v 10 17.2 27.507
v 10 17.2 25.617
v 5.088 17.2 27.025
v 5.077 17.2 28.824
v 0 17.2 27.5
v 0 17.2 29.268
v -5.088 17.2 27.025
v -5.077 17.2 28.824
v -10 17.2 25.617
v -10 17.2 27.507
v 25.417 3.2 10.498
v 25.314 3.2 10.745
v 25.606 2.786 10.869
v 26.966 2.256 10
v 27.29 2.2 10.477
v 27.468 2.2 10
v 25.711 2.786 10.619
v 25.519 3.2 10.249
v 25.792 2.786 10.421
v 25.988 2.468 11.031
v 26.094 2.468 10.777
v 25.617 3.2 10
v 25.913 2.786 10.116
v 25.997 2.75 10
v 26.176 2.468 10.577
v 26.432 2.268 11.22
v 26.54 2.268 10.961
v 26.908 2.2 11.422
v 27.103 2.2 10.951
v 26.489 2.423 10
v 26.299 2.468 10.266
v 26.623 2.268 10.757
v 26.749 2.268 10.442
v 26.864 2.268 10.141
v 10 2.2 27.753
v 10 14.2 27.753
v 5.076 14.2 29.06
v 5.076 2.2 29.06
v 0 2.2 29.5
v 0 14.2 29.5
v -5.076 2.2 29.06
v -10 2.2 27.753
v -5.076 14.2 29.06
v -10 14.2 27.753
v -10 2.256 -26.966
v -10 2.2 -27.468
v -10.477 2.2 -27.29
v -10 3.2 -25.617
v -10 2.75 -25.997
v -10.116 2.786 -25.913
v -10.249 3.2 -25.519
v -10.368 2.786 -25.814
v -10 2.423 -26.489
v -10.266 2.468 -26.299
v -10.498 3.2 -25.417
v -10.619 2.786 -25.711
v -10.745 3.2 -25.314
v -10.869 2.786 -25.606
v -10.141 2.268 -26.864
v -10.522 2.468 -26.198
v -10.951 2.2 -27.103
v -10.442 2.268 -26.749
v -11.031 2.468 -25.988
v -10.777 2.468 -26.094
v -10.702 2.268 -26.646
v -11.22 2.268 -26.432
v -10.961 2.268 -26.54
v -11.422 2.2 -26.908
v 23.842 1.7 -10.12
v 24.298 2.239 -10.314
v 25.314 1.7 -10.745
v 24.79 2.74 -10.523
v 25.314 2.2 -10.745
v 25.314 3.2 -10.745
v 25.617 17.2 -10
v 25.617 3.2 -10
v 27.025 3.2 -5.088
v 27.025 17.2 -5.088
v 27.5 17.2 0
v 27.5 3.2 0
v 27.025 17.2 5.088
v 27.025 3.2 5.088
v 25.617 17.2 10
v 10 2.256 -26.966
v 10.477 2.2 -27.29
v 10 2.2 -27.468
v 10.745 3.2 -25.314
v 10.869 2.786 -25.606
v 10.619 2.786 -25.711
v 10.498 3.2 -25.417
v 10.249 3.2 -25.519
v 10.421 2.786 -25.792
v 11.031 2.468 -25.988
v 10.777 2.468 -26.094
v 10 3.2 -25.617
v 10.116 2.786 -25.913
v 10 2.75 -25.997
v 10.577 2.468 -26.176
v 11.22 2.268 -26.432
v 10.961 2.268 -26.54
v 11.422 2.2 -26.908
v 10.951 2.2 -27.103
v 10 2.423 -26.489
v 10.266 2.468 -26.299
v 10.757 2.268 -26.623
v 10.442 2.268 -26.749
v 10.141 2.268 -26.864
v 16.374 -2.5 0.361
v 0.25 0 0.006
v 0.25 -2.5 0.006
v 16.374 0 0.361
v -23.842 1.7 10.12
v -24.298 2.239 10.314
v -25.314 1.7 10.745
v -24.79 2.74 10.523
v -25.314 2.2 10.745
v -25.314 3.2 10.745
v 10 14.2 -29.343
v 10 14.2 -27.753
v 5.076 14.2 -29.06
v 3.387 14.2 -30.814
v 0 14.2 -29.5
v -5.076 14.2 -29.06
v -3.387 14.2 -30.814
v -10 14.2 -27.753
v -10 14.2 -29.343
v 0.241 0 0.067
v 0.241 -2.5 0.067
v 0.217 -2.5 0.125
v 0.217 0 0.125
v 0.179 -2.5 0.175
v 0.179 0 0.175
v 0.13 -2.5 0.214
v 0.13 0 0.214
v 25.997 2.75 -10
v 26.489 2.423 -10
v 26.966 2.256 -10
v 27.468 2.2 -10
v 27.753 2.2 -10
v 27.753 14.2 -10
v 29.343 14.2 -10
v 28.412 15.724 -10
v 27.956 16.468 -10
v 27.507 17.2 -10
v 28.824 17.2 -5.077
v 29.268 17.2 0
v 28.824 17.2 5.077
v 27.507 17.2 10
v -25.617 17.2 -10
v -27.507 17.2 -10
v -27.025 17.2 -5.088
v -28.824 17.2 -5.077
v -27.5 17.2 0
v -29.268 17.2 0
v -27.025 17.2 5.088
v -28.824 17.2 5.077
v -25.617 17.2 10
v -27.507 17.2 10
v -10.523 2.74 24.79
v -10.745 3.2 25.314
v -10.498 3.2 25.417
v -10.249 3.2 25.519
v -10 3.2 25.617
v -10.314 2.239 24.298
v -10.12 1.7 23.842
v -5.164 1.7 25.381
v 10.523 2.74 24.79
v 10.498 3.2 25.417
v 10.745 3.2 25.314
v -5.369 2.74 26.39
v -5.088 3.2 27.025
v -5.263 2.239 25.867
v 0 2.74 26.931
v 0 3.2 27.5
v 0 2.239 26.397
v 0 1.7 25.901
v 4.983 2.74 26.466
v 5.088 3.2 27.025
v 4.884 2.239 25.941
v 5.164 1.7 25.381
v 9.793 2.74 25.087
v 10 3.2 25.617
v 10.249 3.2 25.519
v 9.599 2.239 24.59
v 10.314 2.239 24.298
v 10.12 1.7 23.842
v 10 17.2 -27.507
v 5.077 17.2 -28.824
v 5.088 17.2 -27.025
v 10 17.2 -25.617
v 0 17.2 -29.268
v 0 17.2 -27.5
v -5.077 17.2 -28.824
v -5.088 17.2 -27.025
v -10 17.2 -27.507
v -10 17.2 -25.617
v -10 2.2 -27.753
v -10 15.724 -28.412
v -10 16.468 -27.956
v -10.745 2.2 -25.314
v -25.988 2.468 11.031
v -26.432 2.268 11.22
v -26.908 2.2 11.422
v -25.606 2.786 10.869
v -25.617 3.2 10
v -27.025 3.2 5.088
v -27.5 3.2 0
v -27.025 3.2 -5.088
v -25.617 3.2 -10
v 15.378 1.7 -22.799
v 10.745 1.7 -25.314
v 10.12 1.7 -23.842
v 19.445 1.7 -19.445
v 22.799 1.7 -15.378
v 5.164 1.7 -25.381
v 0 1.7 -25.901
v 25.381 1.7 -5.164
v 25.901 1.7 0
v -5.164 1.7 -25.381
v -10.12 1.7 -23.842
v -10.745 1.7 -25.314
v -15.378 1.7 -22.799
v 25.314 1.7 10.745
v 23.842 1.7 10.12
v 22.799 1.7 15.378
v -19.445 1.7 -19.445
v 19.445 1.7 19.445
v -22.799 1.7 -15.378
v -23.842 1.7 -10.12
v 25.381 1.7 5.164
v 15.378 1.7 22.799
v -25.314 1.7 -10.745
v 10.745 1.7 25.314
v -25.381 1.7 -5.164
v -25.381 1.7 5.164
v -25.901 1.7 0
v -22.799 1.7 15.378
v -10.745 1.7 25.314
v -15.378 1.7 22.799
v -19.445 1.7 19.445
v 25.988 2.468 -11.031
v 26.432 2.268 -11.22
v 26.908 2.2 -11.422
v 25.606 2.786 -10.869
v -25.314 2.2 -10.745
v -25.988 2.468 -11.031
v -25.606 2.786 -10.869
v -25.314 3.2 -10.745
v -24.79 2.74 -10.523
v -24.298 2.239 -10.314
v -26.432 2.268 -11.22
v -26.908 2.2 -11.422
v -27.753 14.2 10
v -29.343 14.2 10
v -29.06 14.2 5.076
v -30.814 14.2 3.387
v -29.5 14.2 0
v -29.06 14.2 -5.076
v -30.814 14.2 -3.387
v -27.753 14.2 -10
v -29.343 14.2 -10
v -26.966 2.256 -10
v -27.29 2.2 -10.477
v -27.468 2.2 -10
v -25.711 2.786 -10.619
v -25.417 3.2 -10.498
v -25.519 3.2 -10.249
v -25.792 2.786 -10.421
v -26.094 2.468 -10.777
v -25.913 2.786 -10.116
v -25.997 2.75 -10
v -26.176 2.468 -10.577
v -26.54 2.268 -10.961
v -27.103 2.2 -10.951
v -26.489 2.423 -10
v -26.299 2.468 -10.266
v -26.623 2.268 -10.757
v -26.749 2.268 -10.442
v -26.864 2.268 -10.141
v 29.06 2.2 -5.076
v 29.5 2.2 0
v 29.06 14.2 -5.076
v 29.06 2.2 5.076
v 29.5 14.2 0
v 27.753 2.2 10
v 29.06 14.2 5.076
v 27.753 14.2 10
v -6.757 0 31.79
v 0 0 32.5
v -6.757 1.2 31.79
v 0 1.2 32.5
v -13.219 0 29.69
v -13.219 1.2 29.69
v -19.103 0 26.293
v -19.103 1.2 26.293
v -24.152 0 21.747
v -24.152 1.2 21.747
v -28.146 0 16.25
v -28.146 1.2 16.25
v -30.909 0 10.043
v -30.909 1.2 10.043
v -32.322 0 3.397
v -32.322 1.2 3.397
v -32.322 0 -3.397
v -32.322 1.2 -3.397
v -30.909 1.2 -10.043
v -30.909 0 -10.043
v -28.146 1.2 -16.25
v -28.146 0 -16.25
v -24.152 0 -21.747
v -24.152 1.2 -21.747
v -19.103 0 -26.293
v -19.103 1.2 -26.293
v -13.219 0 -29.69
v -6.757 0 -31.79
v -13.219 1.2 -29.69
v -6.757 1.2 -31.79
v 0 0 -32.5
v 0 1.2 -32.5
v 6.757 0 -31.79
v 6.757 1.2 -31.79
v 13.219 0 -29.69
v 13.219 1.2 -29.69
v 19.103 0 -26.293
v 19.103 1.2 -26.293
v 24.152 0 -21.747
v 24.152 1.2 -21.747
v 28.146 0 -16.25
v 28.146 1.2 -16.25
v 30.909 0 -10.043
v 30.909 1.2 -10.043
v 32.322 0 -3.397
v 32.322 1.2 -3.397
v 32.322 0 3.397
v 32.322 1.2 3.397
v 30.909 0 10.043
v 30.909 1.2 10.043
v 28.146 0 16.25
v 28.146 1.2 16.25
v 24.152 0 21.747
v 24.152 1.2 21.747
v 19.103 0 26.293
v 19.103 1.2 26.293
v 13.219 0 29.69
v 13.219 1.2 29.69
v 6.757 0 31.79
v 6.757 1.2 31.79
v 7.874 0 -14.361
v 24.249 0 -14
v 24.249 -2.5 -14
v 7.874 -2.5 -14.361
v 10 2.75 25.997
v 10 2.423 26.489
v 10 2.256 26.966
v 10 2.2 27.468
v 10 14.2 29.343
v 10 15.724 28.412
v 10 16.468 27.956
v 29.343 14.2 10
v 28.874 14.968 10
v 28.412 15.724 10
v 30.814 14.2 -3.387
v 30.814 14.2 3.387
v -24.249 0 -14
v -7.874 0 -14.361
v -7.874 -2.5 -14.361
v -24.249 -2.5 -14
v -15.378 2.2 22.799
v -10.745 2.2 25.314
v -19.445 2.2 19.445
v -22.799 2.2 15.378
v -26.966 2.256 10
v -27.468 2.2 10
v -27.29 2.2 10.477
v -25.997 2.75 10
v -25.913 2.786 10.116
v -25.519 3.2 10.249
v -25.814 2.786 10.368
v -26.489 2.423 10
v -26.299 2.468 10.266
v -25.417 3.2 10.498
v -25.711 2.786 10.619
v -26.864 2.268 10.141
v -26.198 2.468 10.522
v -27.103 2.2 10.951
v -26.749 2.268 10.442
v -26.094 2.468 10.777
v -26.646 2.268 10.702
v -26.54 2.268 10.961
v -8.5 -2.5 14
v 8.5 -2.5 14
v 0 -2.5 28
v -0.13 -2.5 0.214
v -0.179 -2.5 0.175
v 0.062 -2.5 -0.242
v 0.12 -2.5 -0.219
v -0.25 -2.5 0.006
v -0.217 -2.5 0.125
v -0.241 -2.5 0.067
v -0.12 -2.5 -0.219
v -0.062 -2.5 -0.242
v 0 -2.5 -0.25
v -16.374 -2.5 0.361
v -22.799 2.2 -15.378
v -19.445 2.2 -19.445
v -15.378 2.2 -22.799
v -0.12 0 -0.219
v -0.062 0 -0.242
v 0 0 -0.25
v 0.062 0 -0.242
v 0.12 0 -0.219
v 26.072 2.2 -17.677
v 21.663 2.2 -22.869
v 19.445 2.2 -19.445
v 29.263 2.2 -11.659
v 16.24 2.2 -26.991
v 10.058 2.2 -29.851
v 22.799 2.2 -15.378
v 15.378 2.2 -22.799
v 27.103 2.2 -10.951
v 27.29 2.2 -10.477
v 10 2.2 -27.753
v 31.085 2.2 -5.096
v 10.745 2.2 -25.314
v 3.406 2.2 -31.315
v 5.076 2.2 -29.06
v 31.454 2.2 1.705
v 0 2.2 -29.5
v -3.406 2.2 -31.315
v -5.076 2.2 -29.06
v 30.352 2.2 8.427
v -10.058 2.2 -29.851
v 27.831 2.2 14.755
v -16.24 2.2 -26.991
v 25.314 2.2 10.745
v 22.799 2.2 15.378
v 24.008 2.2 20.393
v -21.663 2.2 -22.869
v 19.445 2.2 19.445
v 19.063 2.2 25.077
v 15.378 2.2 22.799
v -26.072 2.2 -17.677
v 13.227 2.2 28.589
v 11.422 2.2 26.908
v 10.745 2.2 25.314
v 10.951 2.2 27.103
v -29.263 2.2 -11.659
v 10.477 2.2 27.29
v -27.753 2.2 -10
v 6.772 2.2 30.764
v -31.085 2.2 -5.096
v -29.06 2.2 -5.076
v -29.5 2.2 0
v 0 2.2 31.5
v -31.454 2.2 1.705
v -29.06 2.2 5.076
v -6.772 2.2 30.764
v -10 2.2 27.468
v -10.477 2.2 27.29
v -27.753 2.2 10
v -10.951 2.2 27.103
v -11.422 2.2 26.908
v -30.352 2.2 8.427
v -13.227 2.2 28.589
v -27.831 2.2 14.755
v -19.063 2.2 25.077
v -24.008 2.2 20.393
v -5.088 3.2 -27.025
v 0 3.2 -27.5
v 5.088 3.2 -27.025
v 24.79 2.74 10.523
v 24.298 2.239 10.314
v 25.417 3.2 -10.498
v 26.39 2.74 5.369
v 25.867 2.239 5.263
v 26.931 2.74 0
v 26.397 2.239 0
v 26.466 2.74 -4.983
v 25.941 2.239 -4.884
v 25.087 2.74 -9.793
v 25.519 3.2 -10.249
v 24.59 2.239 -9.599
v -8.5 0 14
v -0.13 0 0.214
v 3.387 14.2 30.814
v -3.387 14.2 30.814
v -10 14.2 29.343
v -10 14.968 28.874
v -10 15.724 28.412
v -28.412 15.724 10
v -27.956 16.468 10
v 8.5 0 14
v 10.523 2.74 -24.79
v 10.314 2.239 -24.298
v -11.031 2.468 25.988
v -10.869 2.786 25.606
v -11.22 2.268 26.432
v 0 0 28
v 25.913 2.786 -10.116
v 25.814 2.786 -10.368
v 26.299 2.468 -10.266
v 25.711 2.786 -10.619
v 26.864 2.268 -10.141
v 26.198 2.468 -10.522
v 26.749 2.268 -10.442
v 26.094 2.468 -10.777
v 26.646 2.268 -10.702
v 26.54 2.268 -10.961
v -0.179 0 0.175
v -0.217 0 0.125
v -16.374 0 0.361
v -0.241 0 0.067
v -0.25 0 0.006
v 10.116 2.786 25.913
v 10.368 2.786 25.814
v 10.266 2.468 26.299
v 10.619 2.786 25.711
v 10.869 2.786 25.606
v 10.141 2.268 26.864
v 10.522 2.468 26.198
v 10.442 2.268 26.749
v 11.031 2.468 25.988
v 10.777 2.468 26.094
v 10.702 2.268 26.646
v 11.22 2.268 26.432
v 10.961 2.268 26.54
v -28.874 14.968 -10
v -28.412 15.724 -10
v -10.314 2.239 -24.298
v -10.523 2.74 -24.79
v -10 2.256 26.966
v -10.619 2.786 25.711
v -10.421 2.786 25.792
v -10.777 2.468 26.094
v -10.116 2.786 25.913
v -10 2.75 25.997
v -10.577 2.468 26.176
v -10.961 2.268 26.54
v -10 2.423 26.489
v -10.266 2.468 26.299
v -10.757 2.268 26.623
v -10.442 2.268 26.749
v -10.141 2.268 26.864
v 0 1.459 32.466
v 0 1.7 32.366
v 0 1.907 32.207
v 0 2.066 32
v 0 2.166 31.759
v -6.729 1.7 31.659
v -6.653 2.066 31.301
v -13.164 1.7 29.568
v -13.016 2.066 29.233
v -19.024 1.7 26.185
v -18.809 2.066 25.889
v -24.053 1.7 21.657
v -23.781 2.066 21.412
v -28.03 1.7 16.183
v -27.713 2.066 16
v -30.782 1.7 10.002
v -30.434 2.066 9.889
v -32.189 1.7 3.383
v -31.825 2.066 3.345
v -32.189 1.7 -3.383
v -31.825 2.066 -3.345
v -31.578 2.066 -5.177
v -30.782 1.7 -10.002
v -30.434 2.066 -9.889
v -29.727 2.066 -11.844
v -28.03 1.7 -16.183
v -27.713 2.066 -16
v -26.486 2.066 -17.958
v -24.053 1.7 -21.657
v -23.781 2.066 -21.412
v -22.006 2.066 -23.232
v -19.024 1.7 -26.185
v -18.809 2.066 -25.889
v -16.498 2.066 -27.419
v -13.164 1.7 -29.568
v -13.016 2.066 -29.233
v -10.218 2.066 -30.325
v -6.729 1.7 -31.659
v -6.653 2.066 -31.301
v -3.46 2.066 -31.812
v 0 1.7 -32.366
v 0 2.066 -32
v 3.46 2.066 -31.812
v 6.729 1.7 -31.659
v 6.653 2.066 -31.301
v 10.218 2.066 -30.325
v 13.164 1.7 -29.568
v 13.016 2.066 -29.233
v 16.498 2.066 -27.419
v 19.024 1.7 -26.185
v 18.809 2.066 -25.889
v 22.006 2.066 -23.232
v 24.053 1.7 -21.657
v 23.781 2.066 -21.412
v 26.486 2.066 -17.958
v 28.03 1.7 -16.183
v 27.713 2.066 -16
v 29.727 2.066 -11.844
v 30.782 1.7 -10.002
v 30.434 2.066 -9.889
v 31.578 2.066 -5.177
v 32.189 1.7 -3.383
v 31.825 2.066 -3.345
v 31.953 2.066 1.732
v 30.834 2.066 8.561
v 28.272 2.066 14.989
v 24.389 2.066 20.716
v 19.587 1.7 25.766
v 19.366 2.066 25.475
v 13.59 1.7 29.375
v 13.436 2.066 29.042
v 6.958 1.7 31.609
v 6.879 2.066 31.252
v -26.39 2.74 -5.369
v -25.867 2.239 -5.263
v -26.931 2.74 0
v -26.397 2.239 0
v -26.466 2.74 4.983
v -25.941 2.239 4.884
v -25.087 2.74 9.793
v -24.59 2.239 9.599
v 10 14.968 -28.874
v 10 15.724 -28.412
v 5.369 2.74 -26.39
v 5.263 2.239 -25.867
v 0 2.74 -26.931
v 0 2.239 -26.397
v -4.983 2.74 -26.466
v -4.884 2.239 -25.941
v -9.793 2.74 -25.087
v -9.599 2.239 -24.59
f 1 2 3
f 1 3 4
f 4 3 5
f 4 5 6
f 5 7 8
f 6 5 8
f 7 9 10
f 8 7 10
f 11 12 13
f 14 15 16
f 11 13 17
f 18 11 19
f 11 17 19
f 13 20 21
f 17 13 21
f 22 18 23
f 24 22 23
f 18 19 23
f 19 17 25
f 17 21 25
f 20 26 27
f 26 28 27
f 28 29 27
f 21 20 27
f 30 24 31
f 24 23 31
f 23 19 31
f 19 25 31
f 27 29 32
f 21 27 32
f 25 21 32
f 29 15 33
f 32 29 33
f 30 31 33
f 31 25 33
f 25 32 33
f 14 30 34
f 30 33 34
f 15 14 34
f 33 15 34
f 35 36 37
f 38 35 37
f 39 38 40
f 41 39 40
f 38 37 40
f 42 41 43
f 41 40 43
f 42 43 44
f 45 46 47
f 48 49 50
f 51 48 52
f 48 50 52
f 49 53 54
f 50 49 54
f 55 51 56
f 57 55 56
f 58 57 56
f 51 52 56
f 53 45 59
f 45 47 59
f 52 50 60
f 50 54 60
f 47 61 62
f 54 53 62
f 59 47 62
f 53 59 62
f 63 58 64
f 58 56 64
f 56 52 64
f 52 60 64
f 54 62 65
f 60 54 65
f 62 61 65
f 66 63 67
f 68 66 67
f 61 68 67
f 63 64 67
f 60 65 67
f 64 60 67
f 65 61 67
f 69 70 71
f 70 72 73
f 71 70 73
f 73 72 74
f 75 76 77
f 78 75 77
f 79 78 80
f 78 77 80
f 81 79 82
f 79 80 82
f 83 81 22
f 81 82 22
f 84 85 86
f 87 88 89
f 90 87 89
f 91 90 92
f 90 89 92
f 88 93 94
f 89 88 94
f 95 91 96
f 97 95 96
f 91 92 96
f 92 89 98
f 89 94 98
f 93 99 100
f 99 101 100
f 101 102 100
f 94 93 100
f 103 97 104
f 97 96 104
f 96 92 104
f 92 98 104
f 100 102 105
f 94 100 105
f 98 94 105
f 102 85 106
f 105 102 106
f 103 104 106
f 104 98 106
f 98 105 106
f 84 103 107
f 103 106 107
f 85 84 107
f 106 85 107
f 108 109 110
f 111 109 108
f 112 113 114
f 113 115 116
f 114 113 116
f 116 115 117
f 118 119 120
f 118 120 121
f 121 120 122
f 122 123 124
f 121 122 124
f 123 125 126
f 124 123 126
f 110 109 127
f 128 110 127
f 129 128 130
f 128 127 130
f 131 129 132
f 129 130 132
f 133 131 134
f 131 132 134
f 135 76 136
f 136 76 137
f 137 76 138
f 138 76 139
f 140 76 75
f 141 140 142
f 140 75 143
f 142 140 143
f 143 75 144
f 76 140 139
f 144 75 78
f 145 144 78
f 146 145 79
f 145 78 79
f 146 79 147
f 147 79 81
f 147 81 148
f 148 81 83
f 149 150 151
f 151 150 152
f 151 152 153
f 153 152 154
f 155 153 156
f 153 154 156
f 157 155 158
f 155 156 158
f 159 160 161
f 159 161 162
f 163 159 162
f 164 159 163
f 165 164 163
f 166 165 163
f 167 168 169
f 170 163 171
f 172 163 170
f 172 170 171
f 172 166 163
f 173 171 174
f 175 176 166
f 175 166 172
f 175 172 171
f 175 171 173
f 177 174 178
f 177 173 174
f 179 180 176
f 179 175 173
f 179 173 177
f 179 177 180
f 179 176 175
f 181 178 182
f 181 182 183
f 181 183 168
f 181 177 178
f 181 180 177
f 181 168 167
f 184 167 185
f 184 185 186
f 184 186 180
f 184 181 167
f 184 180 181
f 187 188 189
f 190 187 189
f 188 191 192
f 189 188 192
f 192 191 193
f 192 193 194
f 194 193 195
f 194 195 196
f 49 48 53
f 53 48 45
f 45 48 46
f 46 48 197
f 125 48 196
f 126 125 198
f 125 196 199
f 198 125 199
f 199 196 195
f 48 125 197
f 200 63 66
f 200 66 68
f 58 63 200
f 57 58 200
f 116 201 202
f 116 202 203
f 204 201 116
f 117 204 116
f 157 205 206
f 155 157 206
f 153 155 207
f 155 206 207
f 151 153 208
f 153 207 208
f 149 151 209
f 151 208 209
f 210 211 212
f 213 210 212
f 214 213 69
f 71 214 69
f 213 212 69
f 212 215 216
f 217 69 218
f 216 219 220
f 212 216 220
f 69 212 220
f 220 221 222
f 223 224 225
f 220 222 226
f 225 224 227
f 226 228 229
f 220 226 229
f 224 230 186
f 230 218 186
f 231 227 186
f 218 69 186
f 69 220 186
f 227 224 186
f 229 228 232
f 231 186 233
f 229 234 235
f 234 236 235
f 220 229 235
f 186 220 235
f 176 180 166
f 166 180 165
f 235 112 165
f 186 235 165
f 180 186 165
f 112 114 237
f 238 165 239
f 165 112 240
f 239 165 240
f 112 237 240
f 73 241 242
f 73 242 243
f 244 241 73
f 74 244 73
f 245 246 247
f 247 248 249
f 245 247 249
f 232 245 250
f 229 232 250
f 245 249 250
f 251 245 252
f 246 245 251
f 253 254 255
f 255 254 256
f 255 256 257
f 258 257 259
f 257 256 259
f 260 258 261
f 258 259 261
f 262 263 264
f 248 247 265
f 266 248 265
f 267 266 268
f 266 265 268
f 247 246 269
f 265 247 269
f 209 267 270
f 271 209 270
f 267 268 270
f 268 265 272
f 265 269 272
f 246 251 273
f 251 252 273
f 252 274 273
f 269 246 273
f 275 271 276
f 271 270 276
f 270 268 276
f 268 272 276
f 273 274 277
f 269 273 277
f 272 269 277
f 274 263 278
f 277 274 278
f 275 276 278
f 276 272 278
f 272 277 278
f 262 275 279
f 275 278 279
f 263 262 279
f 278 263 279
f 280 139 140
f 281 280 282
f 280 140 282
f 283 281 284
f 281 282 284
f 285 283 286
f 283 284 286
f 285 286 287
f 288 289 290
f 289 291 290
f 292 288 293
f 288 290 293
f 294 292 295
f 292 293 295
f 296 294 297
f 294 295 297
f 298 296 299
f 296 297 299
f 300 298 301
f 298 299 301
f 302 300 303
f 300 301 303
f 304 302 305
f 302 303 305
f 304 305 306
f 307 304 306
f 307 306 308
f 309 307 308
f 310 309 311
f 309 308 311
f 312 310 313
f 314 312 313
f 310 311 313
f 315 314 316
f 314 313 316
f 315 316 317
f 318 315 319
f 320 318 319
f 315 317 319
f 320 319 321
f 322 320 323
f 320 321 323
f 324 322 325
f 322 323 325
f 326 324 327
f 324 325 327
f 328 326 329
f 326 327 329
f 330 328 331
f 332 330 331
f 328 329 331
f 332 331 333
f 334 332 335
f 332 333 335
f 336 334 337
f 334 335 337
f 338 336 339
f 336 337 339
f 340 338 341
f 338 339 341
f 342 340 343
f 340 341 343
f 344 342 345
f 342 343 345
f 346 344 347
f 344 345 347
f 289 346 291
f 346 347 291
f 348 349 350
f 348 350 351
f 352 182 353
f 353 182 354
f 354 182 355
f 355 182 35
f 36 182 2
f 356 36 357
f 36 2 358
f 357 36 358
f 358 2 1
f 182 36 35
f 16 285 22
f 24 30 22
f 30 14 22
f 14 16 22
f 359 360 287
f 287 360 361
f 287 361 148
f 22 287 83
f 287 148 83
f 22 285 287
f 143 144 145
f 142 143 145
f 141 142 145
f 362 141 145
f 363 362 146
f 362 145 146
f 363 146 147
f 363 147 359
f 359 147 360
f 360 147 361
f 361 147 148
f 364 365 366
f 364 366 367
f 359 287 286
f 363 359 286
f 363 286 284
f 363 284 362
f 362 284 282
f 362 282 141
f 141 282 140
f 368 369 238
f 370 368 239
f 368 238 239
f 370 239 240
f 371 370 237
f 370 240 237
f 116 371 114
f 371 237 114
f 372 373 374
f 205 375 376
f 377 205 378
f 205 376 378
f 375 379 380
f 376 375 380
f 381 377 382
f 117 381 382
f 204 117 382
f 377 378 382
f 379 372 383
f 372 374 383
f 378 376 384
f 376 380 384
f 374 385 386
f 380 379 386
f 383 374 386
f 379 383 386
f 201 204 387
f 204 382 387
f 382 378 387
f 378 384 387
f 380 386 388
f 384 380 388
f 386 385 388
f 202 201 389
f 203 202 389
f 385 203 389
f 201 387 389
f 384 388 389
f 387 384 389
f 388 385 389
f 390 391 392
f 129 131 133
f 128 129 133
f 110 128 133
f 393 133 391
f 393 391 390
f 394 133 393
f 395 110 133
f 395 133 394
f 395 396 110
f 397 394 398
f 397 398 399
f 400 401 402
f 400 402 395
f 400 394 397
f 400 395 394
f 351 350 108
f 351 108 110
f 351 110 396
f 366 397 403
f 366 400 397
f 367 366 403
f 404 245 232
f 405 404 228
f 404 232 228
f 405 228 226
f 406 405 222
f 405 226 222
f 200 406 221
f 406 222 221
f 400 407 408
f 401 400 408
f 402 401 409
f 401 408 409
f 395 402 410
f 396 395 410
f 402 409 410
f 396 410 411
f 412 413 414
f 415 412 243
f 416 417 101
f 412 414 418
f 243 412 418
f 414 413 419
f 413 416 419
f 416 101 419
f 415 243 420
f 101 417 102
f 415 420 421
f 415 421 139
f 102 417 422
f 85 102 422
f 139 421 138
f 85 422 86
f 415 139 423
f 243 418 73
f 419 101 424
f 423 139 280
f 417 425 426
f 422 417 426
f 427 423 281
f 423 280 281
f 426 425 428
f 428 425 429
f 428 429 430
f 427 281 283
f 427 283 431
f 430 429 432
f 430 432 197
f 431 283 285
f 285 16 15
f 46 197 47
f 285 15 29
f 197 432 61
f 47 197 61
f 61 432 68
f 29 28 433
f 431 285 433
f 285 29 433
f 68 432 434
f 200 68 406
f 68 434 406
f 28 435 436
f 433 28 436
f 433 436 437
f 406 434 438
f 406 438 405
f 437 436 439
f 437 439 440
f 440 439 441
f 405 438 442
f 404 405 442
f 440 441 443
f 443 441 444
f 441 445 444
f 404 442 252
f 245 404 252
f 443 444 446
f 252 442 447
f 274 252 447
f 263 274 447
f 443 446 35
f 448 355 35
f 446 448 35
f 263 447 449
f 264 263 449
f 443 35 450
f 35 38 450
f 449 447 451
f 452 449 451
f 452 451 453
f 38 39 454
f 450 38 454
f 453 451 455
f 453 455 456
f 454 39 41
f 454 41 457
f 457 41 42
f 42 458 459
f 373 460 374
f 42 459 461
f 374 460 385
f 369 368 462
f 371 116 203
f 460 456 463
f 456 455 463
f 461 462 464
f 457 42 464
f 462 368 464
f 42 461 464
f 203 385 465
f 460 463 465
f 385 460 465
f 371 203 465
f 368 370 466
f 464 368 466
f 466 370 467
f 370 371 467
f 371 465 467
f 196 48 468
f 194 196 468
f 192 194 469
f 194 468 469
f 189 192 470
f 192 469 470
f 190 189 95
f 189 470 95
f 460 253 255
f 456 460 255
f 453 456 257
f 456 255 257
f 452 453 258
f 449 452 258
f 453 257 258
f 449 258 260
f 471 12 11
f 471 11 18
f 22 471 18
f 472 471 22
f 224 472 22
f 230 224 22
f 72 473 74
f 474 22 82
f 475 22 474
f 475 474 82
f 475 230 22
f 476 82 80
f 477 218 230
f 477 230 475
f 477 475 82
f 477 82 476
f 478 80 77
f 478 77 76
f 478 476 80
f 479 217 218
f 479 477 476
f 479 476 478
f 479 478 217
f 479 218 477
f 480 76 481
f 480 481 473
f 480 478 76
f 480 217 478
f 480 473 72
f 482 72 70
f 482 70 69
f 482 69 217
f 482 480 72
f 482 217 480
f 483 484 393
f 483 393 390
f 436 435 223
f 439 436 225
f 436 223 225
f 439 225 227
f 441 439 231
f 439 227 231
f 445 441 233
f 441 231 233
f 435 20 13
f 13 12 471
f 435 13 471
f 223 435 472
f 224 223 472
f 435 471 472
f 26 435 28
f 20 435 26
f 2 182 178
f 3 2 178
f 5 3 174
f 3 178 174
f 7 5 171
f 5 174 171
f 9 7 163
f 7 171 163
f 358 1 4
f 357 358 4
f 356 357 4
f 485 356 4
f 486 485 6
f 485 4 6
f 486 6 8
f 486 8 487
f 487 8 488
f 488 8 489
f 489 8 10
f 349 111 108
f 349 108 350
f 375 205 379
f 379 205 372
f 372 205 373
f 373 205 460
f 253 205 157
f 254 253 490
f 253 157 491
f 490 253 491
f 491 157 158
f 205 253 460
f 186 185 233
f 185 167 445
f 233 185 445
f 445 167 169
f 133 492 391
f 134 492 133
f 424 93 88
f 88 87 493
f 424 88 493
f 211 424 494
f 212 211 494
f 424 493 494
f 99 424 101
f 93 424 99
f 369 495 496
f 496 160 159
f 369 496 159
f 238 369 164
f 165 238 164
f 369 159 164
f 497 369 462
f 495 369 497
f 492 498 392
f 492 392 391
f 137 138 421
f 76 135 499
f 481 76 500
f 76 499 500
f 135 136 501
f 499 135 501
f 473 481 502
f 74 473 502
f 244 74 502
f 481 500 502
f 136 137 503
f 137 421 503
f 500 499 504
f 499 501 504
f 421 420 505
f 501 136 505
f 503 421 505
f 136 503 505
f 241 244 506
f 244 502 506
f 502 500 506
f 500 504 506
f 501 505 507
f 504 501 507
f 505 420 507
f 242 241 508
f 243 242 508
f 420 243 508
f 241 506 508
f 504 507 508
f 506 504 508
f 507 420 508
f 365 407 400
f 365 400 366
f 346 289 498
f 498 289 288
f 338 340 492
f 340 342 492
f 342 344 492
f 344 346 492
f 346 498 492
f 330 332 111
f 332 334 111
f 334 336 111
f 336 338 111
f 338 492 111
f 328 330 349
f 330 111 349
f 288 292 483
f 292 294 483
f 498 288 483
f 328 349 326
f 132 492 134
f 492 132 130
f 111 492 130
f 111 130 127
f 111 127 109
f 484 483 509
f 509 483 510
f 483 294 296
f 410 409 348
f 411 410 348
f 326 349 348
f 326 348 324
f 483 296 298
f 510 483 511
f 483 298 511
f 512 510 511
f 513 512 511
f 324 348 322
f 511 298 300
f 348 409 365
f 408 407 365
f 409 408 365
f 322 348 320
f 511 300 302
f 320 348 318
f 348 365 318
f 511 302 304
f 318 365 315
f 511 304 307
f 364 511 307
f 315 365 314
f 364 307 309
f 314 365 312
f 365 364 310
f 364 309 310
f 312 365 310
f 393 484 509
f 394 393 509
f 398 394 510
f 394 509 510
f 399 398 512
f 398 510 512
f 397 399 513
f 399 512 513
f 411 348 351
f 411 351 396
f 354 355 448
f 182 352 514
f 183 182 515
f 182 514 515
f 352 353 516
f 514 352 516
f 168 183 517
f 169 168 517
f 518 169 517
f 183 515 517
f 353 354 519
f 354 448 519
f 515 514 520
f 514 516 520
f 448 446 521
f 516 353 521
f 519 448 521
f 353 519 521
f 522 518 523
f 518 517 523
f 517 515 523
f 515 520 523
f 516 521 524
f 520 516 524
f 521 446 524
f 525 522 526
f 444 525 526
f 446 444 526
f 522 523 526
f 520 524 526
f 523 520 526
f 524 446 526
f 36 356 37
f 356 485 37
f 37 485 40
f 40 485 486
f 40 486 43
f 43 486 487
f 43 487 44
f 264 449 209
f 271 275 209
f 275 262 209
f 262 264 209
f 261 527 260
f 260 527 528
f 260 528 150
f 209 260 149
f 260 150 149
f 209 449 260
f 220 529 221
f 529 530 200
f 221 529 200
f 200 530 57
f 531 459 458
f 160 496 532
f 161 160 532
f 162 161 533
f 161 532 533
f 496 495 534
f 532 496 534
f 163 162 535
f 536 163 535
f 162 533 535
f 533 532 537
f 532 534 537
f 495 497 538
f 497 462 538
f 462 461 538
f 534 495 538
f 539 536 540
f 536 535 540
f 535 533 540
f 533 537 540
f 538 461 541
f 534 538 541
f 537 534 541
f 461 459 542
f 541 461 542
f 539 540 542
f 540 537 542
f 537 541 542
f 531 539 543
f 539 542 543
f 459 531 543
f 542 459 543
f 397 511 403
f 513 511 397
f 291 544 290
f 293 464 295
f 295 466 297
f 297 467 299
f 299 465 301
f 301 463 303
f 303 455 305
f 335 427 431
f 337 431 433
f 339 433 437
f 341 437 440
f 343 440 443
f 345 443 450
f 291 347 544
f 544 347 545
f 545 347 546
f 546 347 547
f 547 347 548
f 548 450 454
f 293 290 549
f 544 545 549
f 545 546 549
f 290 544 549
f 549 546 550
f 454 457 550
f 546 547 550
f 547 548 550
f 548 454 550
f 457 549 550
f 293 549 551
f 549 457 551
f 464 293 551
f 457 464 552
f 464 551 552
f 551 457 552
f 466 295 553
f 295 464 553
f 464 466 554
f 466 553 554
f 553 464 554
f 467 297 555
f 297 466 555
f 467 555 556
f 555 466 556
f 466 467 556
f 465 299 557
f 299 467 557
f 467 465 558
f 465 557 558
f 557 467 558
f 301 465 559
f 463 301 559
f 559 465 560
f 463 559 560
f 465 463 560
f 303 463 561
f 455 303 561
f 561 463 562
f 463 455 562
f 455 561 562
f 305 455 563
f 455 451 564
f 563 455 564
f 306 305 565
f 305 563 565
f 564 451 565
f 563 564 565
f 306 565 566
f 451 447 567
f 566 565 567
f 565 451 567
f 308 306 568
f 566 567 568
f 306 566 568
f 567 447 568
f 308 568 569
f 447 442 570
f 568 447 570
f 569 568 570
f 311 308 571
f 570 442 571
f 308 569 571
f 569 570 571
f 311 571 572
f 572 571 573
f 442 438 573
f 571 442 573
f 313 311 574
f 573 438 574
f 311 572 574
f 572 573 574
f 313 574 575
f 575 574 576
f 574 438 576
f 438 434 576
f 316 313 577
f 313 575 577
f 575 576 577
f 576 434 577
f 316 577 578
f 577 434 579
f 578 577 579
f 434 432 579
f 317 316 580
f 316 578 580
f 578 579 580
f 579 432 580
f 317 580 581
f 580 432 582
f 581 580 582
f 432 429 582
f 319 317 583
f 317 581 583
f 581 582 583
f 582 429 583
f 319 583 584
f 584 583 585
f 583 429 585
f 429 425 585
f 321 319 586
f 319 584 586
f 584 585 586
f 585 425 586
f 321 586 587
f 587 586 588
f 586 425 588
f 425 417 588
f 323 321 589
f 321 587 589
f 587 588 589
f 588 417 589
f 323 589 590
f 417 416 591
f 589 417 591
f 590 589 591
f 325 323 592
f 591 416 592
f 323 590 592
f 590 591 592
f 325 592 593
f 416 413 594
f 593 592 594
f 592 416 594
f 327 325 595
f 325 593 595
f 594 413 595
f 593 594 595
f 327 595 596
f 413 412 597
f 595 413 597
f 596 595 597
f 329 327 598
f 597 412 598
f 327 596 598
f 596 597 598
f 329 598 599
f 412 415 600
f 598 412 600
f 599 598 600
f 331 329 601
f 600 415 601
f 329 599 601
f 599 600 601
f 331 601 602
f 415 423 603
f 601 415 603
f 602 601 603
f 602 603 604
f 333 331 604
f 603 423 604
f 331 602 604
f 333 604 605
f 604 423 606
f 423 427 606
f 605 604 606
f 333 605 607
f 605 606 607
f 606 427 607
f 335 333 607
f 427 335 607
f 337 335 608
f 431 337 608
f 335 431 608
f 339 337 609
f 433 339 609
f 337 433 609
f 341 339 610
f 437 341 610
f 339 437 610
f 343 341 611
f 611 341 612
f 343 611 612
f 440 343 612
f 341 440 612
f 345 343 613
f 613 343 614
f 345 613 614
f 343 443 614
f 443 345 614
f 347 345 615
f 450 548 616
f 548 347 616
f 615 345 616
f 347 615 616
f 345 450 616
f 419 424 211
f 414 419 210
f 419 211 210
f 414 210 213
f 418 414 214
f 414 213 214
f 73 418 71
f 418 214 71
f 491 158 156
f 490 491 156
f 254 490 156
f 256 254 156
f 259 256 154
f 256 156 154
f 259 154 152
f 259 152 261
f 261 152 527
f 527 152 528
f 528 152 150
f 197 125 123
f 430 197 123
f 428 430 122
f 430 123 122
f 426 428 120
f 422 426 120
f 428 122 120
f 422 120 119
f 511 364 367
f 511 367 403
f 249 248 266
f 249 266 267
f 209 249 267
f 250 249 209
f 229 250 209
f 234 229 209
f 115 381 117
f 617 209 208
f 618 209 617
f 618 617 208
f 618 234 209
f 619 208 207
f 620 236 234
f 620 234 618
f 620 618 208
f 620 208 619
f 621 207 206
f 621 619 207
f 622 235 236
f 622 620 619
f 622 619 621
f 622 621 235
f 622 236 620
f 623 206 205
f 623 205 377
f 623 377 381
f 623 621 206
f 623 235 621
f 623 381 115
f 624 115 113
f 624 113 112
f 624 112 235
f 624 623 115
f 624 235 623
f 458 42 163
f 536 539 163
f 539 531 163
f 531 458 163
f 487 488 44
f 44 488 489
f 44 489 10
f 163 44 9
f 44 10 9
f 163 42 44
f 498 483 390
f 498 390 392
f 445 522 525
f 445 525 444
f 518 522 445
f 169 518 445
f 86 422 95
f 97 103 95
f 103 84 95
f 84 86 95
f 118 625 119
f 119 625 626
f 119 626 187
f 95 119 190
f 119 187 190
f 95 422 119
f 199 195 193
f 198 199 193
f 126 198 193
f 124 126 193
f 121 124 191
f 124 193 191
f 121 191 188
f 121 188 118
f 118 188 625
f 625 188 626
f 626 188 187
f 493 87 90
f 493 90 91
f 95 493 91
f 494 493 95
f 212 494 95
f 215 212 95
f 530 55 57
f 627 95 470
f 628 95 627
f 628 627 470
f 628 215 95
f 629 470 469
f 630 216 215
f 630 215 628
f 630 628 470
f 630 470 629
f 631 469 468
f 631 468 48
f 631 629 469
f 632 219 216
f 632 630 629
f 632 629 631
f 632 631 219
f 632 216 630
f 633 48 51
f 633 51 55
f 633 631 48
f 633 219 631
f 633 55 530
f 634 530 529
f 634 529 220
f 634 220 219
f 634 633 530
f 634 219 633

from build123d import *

# Parameters (mm, degrees)
CUT_EXTRUDE_1_REACH      = 51.075
REVOLVE_2_ANGLE          = 46
PATTERN_CIRCULAR_6_COUNT = 4
FILLET_3_R               = 2
SKETCH_4_R               = 0.25
EXTRUDE_1_DEPTH          = 2.5


with BuildPart() as part:
    # Эскиз1 → Повернуть1 (revolve)
    with BuildSketch(Plane.XY, mode=Mode.PRIVATE) as revolve_1_sk:
        with BuildLine():
            Line((0, 0), (-32.5, 0))
            Line((-32.5, 0), (-32.5, 1.2))
            ThreePointArc((-32.5, 1.2), (-32.207106781, 1.907106781), (-31.5, 2.2))
            Line((-31.5, 2.2), (-29.5, 2.2))
            Line((-29.5, 2.2), (-29.5, 14.2))
            Line((-29.5, 14.2), (-31, 14.2))
            Line((-31, 14.2), (-29.267949192, 17.2))
            Line((-29.267949192, 17.2), (-27.5, 17.2))
            Line((-27.5, 17.2), (-27.5, 1.7))
            Line((-27.5, 1.7), (0, 1.7))
            Line((0, 1.7), (0, 0))
        make_face()
    revolve(revolve_1_sk.sketch.rotate(Axis((0, 0, 0), (0, -1, 0)), 270), axis=Axis((0, 0, 0), (0, -1, 0)))

    # Вырез-Вытянуть1: up to this face of the body (flat: up to its plane)
    cut_extrude_1_end = Plane(part.part.faces().sort_by_distance((0, 2.2, -30.609045456))[0])
    # Эскиз2 → Вырез-Вытянуть1 (cut, up to the picked face)
    with BuildSketch(Plane(origin=(0, 17.2, 0), x_dir=(1, 0, 0), z_dir=(0, 1, 0)), mode=Mode.PRIVATE) as cut_extrude_1_sk1:
        with BuildLine():
            Line((-10, 27.50659648), (-10, 40.856644609))
            ThreePointArc((-10, 40.856644609), (-29.742775667, 29.742775667), (-40.856644609, 10))
            Line((-40.856644609, 10), (-27.50659648, 10))
            ThreePointArc((-27.50659648, 10), (-20.695565345, 20.695565345), (-10, 27.50659648))
        make_face()
    cut_extrude_1_tool1 = split(extrude(cut_extrude_1_sk1.sketch, amount=-CUT_EXTRUDE_1_REACH, mode=Mode.PRIVATE), bisect_by=cut_extrude_1_end, keep=Keep.BOTH, mode=Mode.PRIVATE)
    # Эскиз2 → Вырез-Вытянуть1 (cut, up to the picked face)
    with BuildSketch(Plane(origin=(0, 17.2, 0), x_dir=(1, 0, 0), z_dir=(0, 1, 0)), mode=Mode.PRIVATE) as cut_extrude_1_sk2:
        with BuildLine():
            ThreePointArc((27.50659648, 10), (20.695565345, 20.695565345), (10, 27.50659648))
            Line((10, 27.50659648), (10, 25.617376915))
            ThreePointArc((10, 25.617376915), (19.445436483, 19.445436483), (25.617376915, 10))
            Line((25.617376915, 10), (27.50659648, 10))
        make_face()
    cut_extrude_1_tool2 = split(extrude(cut_extrude_1_sk2.sketch, amount=-CUT_EXTRUDE_1_REACH, mode=Mode.PRIVATE), bisect_by=cut_extrude_1_end, keep=Keep.BOTH, mode=Mode.PRIVATE)
    # Эскиз2 → Вырез-Вытянуть1 (cut, up to the picked face)
    with BuildSketch(Plane(origin=(0, 17.2, 0), x_dir=(1, 0, 0), z_dir=(0, 1, 0)), mode=Mode.PRIVATE) as cut_extrude_1_sk3:
        with BuildLine():
            ThreePointArc((40.856644609, 10), (29.742775667, 29.742775667), (10, 40.856644609))
            Line((10, 40.856644609), (10, 27.50659648))
            ThreePointArc((10, 27.50659648), (20.695565345, 20.695565345), (27.50659648, 10))
            Line((27.50659648, 10), (40.856644609, 10))
        make_face()
    cut_extrude_1_tool3 = split(extrude(cut_extrude_1_sk3.sketch, amount=-CUT_EXTRUDE_1_REACH, mode=Mode.PRIVATE), bisect_by=cut_extrude_1_end, keep=Keep.BOTH, mode=Mode.PRIVATE)
    # Эскиз2 → Вырез-Вытянуть1 (cut, up to the picked face)
    with BuildSketch(Plane(origin=(0, 17.2, 0), x_dir=(1, 0, 0), z_dir=(0, 1, 0)), mode=Mode.PRIVATE) as cut_extrude_1_sk4:
        with BuildLine():
            ThreePointArc((10, -40.856644609), (29.742775667, -29.742775667), (40.856644609, -10))
            Line((40.856644609, -10), (27.50659648, -10))
            ThreePointArc((27.50659648, -10), (20.695565345, -20.695565345), (10, -27.50659648))
            Line((10, -27.50659648), (10, -40.856644609))
        make_face()
    cut_extrude_1_tool4 = split(extrude(cut_extrude_1_sk4.sketch, amount=-CUT_EXTRUDE_1_REACH, mode=Mode.PRIVATE), bisect_by=cut_extrude_1_end, keep=Keep.BOTH, mode=Mode.PRIVATE)
    # Эскиз2 → Вырез-Вытянуть1 (cut, up to the picked face)
    with BuildSketch(Plane(origin=(0, 17.2, 0), x_dir=(1, 0, 0), z_dir=(0, 1, 0)), mode=Mode.PRIVATE) as cut_extrude_1_sk5:
        with BuildLine():
            ThreePointArc((10, -27.50659648), (20.695565345, -20.695565345), (27.50659648, -10))
            Line((27.50659648, -10), (25.617376915, -10))
            ThreePointArc((25.617376915, -10), (19.445436483, -19.445436483), (10, -25.617376915))
            Line((10, -25.617376915), (10, -27.50659648))
        make_face()
    cut_extrude_1_tool5 = split(extrude(cut_extrude_1_sk5.sketch, amount=-CUT_EXTRUDE_1_REACH, mode=Mode.PRIVATE), bisect_by=cut_extrude_1_end, keep=Keep.BOTH, mode=Mode.PRIVATE)
    # Эскиз2 → Вырез-Вытянуть1 (cut, up to the picked face)
    with BuildSketch(Plane(origin=(0, 17.2, 0), x_dir=(1, 0, 0), z_dir=(0, 1, 0)), mode=Mode.PRIVATE) as cut_extrude_1_sk6:
        with BuildLine():
            Line((-27.50659648, -10), (-40.856644609, -10))
            ThreePointArc((-40.856644609, -10), (-29.742775667, -29.742775667), (-10, -40.856644609))
            Line((-10, -40.856644609), (-10, -27.50659648))
            ThreePointArc((-10, -27.50659648), (-20.695565345, -20.695565345), (-27.50659648, -10))
        make_face()
    cut_extrude_1_tool6 = split(extrude(cut_extrude_1_sk6.sketch, amount=-CUT_EXTRUDE_1_REACH, mode=Mode.PRIVATE), bisect_by=cut_extrude_1_end, keep=Keep.BOTH, mode=Mode.PRIVATE)
    # Эскиз2 → Вырез-Вытянуть1 (cut, up to the picked face)
    with BuildSketch(Plane(origin=(0, 17.2, 0), x_dir=(1, 0, 0), z_dir=(0, 1, 0)), mode=Mode.PRIVATE) as cut_extrude_1_sk7:
        with BuildLine():
            Line((-25.617376915, -10), (-27.50659648, -10))
            ThreePointArc((-27.50659648, -10), (-20.695565345, -20.695565345), (-10, -27.50659648))
            Line((-10, -27.50659648), (-10, -25.617376915))
            ThreePointArc((-10, -25.617376915), (-19.445436483, -19.445436483), (-25.617376915, -10))
        make_face()
    cut_extrude_1_tool7 = split(extrude(cut_extrude_1_sk7.sketch, amount=-CUT_EXTRUDE_1_REACH, mode=Mode.PRIVATE), bisect_by=cut_extrude_1_end, keep=Keep.BOTH, mode=Mode.PRIVATE)
    # Эскиз2 → Вырез-Вытянуть1 (cut, up to the picked face)
    with BuildSketch(Plane(origin=(0, 17.2, 0), x_dir=(1, 0, 0), z_dir=(0, 1, 0)), mode=Mode.PRIVATE) as cut_extrude_1_sk8:
        with BuildLine():
            Line((-10, 25.617376915), (-10, 27.50659648))
            ThreePointArc((-10, 27.50659648), (-20.695565345, 20.695565345), (-27.50659648, 10))
            Line((-27.50659648, 10), (-25.617376915, 10))
            ThreePointArc((-25.617376915, 10), (-19.445436483, 19.445436483), (-10, 25.617376915))
        make_face()
    cut_extrude_1_tool8 = split(extrude(cut_extrude_1_sk8.sketch, amount=-CUT_EXTRUDE_1_REACH, mode=Mode.PRIVATE), bisect_by=cut_extrude_1_end, keep=Keep.BOTH, mode=Mode.PRIVATE)
    add(cut_extrude_1_tool1.solids().sort_by(Axis((-24.563821, 17.2, -24.563821), (0, -1, 0)))[0], mode=Mode.SUBTRACT)
    add(cut_extrude_1_tool2.solids().sort_by(Axis((19.481832, 17.2, -19.481832), (0, -1, 0)))[0], mode=Mode.SUBTRACT)
    add(cut_extrude_1_tool3.solids().sort_by(Axis((24.563821, 17.2, -24.563821), (0, -1, 0)))[0], mode=Mode.SUBTRACT)
    add(cut_extrude_1_tool4.solids().sort_by(Axis((24.563821, 17.2, 24.563821), (0, -1, 0)))[0], mode=Mode.SUBTRACT)
    add(cut_extrude_1_tool5.solids().sort_by(Axis((19.481832, 17.2, 19.481832), (0, -1, 0)))[0], mode=Mode.SUBTRACT)
    add(cut_extrude_1_tool6.solids().sort_by(Axis((-24.563821, 17.2, 24.563821), (0, -1, 0)))[0], mode=Mode.SUBTRACT)
    add(cut_extrude_1_tool7.solids().sort_by(Axis((-19.481832, 17.2, 19.481832), (0, -1, 0)))[0], mode=Mode.SUBTRACT)
    add(cut_extrude_1_tool8.solids().sort_by(Axis((-19.481832, 17.2, -19.481832), (0, -1, 0)))[0], mode=Mode.SUBTRACT)

    # Повернуть2: read off the stored shape, not the designer's step
    # Повернуть2 outline → Повернуть2 (revolve)
    with BuildSketch(Plane(origin=(0, 0, 0), x_dir=(-0.9205048534524393, 0, -0.3907311284892762), z_dir=(0.3907311284892762, 0, -0.9205048534524393))):
        with BuildLine():
            Line((27.5, 1.7), (27.5, 3.2))
            ThreePointArc((27.5, 3.2), (26.65909171, 2.493968314), (25.900657923, 1.7))
            Line((25.900657923, 1.7), (27.5, 1.7))
        make_face()
    revolve_2 = revolve(axis=Axis((0, 0, 0), (0, 1, 0)), revolution_arc=REVOLVE_2_ANGLE)

    # Круговой массив6: Повернуть2 ×4 about axis
    pattern_circular_6_axis = Axis((0, 0, 0), (0, 1, 0))
    for i in range(1, PATTERN_CIRCULAR_6_COUNT):
        add(revolve_2.rotate(pattern_circular_6_axis, i * 360 / PATTERN_CIRCULAR_6_COUNT))

    # Скругление3
    # the kernel refuses this fillet: 2 mm, written as the material it adds along each edge
    with BuildSketch(Plane(origin=(0, 2.2, 0), x_dir=(-0.21306345885577038, 0, -0.9770383628601365), z_dir=(0.9770383628601365, 0, -0.21306345885577038))) as fillet_3_piece_1:
        with BuildLine():
            CenterArc((29.232050808, 2), FILLET_3_R, 210, 60)
            Line((27.5, 1), (27.5, 0))
            Line((27.5, 0), (29.232050808, 0))
        make_face()
    revolve(axis=Axis((0, 2.2, 0), (0, 1, 0)), revolution_arc=10.698060555)
    with BuildSketch(Plane(origin=(0, 2.2, 0), x_dir=(-0.9205048534524419, 0, -0.39073112848927005), z_dir=(0.39073112848927005, 0, -0.9205048534524419))) as fillet_3_piece_2:
        with BuildLine():
            CenterArc((29.232050808, 2), FILLET_3_R, 210, 60)
            Line((27.5, 1), (27.5, 0))
            Line((27.5, 0), (29.232050808, 0))
        make_face()
    revolve(axis=Axis((0, 2.2, 0), (0, 1, 0)), revolution_arc=10.698060555)
    with BuildSketch(Plane(origin=(0, 2.2, 0), x_dir=(-0.3907311284892926, 0, 0.9205048534524323), z_dir=(-0.9205048534524323, 0, -0.3907311284892926))) as fillet_3_piece_3:
        with BuildLine():
            CenterArc((29.232050808, 2), FILLET_3_R, 210, 60)
            Line((27.5, 1), (27.5, 0))
            Line((27.5, 0), (29.232050808, 0))
        make_face()
    revolve(axis=Axis((0, 2.2, 0), (0, 1, 0)), revolution_arc=10.698060555)
    with BuildSketch(Plane(origin=(0, 2.2, 0), x_dir=(0.9205048534524326, 0, 0.3907311284892922), z_dir=(-0.3907311284892922, 0, 0.9205048534524326))) as fillet_3_piece_4:
        with BuildLine():
            CenterArc((29.232050808, 2), FILLET_3_R, 210, 60)
            Line((27.5, 1), (27.5, 0))
            Line((27.5, 0), (29.232050808, 0))
        make_face()
    revolve(axis=Axis((0, 2.2, 0), (0, 1, 0)), revolution_arc=10.698060555)
    with BuildSketch(Plane(origin=(0, 2.2, 0), x_dir=(0.3907311284892925, 0, -0.9205048534524325), z_dir=(0.9205048534524325, 0, 0.3907311284892925))) as fillet_3_piece_5:
        with BuildLine():
            CenterArc((29.232050808, 2), FILLET_3_R, 210, 60)
            Line((27.5, 1), (27.5, 0))
            Line((27.5, 0), (29.232050808, 0))
        make_face()
    revolve(axis=Axis((0, 2.2, 0), (0, 1, 0)), revolution_arc=10.698060555)
    with BuildSketch(Plane(origin=(0, 2.2, 0), x_dir=(0.9770383628601332, 0, -0.21306345885578468), z_dir=(0.21306345885578468, 0, 0.9770383628601332))) as fillet_3_piece_6:
        with BuildLine():
            CenterArc((29.232050808, 2), FILLET_3_R, 210, 60)
            Line((27.5, 1), (27.5, 0))
            Line((27.5, 0), (29.232050808, 0))
        make_face()
    revolve(axis=Axis((0, 2.2, 0), (0, 1, 0)), revolution_arc=10.698060555)
    with BuildSketch(Plane(origin=(0, 2.2, 0), x_dir=(0.21306345885579284, 0, 0.9770383628601315), z_dir=(-0.9770383628601315, 0, 0.21306345885579284))) as fillet_3_piece_7:
        with BuildLine():
            CenterArc((29.232050808, 2), FILLET_3_R, 210, 60)
            Line((27.5, 1), (27.5, 0))
            Line((27.5, 0), (29.232050808, 0))
        make_face()
    revolve(axis=Axis((0, 2.2, 0), (0, 1, 0)), revolution_arc=10.698060555)
    with BuildSketch(Plane(origin=(0, 2.2, 0), x_dir=(-0.9770383628601342, 0, 0.21306345885578018), z_dir=(-0.21306345885578018, 0, -0.9770383628601342))) as fillet_3_piece_8:
        with BuildLine():
            CenterArc((29.232050808, 2), FILLET_3_R, 210, 60)
            Line((27.5, 1), (27.5, 0))
            Line((27.5, 0), (29.232050808, 0))
        make_face()
    revolve(axis=Axis((0, 2.2, 0), (0, 1, 0)), revolution_arc=10.698060555)

    # Эскиз4 → Бобышка-Вытянуть1 (add)
    with BuildSketch(Plane(origin=(0, 0, 0), x_dir=(-1, 0, 0), z_dir=(0, -1, 0))):
        Circle(SKETCH_4_R)
        Polygon((-8.5, -14), (0, 0), (8.5, -14), (0, -28), align=None)
        Polygon((16.374355653, -0.361215932), (0, 0), (7.874355653, 14.361215932), (24.248711306, 14), align=None)
        Polygon((-7.874355653, 14.361215932), (0, 0), (-16.374355653, -0.361215932), (-24.248711306, 14), align=None)
        with BuildLine():
            ThreePointArc((-0.249939193, -0.005513623), (-0.216506351, -0.125), (-0.129744534, -0.213696879))
            Line((-0.129744534, -0.213696879), (0, 0))
            Line((0, 0), (-0.249939193, -0.005513623))
        make_face()
        with BuildLine():
            ThreePointArc((-0.129744534, -0.213696879), (0, -0.25), (0.129744534, -0.213696879))
            Line((0.129744534, -0.213696879), (0, 0))
            Line((0, 0), (-0.129744534, -0.213696879))
        make_face()
        with BuildLine():
            Line((0, 0), (0.129744534, -0.213696879))
            ThreePointArc((0.129744534, -0.213696879), (0.216506351, -0.125), (0.249939193, -0.005513623))
            Line((0.249939193, -0.005513623), (0, 0))
        make_face()
        with BuildLine():
            Line((-0.120194659, 0.219210501), (0, 0))
            Line((0, 0), (0.120194659, 0.219210501))
            ThreePointArc((0.120194659, 0.219210501), (0, 0.25), (-0.120194659, 0.219210501))
        make_face()
        with BuildLine():
            Line((0.120194659, 0.219210501), (0, 0))
            Line((0, 0), (0.249939193, -0.005513623))
            ThreePointArc((0.249939193, -0.005513623), (0.249984798, -0.002756979), (0.25, 0))
            ThreePointArc((0.25, 0), (0.215114696, 0.127380013), (0.120194659, 0.219210501))
        make_face()
        with BuildLine():
            Line((-0.249939193, -0.005513623), (0, 0))
            Line((0, 0), (-0.120194659, 0.219210501))
            ThreePointArc((-0.120194659, 0.219210501), (-0.216506351, 0.125), (-0.249939193, -0.005513623))
        make_face()
    extrude(amount=EXTRUDE_1_DEPTH)


solid = part.part
